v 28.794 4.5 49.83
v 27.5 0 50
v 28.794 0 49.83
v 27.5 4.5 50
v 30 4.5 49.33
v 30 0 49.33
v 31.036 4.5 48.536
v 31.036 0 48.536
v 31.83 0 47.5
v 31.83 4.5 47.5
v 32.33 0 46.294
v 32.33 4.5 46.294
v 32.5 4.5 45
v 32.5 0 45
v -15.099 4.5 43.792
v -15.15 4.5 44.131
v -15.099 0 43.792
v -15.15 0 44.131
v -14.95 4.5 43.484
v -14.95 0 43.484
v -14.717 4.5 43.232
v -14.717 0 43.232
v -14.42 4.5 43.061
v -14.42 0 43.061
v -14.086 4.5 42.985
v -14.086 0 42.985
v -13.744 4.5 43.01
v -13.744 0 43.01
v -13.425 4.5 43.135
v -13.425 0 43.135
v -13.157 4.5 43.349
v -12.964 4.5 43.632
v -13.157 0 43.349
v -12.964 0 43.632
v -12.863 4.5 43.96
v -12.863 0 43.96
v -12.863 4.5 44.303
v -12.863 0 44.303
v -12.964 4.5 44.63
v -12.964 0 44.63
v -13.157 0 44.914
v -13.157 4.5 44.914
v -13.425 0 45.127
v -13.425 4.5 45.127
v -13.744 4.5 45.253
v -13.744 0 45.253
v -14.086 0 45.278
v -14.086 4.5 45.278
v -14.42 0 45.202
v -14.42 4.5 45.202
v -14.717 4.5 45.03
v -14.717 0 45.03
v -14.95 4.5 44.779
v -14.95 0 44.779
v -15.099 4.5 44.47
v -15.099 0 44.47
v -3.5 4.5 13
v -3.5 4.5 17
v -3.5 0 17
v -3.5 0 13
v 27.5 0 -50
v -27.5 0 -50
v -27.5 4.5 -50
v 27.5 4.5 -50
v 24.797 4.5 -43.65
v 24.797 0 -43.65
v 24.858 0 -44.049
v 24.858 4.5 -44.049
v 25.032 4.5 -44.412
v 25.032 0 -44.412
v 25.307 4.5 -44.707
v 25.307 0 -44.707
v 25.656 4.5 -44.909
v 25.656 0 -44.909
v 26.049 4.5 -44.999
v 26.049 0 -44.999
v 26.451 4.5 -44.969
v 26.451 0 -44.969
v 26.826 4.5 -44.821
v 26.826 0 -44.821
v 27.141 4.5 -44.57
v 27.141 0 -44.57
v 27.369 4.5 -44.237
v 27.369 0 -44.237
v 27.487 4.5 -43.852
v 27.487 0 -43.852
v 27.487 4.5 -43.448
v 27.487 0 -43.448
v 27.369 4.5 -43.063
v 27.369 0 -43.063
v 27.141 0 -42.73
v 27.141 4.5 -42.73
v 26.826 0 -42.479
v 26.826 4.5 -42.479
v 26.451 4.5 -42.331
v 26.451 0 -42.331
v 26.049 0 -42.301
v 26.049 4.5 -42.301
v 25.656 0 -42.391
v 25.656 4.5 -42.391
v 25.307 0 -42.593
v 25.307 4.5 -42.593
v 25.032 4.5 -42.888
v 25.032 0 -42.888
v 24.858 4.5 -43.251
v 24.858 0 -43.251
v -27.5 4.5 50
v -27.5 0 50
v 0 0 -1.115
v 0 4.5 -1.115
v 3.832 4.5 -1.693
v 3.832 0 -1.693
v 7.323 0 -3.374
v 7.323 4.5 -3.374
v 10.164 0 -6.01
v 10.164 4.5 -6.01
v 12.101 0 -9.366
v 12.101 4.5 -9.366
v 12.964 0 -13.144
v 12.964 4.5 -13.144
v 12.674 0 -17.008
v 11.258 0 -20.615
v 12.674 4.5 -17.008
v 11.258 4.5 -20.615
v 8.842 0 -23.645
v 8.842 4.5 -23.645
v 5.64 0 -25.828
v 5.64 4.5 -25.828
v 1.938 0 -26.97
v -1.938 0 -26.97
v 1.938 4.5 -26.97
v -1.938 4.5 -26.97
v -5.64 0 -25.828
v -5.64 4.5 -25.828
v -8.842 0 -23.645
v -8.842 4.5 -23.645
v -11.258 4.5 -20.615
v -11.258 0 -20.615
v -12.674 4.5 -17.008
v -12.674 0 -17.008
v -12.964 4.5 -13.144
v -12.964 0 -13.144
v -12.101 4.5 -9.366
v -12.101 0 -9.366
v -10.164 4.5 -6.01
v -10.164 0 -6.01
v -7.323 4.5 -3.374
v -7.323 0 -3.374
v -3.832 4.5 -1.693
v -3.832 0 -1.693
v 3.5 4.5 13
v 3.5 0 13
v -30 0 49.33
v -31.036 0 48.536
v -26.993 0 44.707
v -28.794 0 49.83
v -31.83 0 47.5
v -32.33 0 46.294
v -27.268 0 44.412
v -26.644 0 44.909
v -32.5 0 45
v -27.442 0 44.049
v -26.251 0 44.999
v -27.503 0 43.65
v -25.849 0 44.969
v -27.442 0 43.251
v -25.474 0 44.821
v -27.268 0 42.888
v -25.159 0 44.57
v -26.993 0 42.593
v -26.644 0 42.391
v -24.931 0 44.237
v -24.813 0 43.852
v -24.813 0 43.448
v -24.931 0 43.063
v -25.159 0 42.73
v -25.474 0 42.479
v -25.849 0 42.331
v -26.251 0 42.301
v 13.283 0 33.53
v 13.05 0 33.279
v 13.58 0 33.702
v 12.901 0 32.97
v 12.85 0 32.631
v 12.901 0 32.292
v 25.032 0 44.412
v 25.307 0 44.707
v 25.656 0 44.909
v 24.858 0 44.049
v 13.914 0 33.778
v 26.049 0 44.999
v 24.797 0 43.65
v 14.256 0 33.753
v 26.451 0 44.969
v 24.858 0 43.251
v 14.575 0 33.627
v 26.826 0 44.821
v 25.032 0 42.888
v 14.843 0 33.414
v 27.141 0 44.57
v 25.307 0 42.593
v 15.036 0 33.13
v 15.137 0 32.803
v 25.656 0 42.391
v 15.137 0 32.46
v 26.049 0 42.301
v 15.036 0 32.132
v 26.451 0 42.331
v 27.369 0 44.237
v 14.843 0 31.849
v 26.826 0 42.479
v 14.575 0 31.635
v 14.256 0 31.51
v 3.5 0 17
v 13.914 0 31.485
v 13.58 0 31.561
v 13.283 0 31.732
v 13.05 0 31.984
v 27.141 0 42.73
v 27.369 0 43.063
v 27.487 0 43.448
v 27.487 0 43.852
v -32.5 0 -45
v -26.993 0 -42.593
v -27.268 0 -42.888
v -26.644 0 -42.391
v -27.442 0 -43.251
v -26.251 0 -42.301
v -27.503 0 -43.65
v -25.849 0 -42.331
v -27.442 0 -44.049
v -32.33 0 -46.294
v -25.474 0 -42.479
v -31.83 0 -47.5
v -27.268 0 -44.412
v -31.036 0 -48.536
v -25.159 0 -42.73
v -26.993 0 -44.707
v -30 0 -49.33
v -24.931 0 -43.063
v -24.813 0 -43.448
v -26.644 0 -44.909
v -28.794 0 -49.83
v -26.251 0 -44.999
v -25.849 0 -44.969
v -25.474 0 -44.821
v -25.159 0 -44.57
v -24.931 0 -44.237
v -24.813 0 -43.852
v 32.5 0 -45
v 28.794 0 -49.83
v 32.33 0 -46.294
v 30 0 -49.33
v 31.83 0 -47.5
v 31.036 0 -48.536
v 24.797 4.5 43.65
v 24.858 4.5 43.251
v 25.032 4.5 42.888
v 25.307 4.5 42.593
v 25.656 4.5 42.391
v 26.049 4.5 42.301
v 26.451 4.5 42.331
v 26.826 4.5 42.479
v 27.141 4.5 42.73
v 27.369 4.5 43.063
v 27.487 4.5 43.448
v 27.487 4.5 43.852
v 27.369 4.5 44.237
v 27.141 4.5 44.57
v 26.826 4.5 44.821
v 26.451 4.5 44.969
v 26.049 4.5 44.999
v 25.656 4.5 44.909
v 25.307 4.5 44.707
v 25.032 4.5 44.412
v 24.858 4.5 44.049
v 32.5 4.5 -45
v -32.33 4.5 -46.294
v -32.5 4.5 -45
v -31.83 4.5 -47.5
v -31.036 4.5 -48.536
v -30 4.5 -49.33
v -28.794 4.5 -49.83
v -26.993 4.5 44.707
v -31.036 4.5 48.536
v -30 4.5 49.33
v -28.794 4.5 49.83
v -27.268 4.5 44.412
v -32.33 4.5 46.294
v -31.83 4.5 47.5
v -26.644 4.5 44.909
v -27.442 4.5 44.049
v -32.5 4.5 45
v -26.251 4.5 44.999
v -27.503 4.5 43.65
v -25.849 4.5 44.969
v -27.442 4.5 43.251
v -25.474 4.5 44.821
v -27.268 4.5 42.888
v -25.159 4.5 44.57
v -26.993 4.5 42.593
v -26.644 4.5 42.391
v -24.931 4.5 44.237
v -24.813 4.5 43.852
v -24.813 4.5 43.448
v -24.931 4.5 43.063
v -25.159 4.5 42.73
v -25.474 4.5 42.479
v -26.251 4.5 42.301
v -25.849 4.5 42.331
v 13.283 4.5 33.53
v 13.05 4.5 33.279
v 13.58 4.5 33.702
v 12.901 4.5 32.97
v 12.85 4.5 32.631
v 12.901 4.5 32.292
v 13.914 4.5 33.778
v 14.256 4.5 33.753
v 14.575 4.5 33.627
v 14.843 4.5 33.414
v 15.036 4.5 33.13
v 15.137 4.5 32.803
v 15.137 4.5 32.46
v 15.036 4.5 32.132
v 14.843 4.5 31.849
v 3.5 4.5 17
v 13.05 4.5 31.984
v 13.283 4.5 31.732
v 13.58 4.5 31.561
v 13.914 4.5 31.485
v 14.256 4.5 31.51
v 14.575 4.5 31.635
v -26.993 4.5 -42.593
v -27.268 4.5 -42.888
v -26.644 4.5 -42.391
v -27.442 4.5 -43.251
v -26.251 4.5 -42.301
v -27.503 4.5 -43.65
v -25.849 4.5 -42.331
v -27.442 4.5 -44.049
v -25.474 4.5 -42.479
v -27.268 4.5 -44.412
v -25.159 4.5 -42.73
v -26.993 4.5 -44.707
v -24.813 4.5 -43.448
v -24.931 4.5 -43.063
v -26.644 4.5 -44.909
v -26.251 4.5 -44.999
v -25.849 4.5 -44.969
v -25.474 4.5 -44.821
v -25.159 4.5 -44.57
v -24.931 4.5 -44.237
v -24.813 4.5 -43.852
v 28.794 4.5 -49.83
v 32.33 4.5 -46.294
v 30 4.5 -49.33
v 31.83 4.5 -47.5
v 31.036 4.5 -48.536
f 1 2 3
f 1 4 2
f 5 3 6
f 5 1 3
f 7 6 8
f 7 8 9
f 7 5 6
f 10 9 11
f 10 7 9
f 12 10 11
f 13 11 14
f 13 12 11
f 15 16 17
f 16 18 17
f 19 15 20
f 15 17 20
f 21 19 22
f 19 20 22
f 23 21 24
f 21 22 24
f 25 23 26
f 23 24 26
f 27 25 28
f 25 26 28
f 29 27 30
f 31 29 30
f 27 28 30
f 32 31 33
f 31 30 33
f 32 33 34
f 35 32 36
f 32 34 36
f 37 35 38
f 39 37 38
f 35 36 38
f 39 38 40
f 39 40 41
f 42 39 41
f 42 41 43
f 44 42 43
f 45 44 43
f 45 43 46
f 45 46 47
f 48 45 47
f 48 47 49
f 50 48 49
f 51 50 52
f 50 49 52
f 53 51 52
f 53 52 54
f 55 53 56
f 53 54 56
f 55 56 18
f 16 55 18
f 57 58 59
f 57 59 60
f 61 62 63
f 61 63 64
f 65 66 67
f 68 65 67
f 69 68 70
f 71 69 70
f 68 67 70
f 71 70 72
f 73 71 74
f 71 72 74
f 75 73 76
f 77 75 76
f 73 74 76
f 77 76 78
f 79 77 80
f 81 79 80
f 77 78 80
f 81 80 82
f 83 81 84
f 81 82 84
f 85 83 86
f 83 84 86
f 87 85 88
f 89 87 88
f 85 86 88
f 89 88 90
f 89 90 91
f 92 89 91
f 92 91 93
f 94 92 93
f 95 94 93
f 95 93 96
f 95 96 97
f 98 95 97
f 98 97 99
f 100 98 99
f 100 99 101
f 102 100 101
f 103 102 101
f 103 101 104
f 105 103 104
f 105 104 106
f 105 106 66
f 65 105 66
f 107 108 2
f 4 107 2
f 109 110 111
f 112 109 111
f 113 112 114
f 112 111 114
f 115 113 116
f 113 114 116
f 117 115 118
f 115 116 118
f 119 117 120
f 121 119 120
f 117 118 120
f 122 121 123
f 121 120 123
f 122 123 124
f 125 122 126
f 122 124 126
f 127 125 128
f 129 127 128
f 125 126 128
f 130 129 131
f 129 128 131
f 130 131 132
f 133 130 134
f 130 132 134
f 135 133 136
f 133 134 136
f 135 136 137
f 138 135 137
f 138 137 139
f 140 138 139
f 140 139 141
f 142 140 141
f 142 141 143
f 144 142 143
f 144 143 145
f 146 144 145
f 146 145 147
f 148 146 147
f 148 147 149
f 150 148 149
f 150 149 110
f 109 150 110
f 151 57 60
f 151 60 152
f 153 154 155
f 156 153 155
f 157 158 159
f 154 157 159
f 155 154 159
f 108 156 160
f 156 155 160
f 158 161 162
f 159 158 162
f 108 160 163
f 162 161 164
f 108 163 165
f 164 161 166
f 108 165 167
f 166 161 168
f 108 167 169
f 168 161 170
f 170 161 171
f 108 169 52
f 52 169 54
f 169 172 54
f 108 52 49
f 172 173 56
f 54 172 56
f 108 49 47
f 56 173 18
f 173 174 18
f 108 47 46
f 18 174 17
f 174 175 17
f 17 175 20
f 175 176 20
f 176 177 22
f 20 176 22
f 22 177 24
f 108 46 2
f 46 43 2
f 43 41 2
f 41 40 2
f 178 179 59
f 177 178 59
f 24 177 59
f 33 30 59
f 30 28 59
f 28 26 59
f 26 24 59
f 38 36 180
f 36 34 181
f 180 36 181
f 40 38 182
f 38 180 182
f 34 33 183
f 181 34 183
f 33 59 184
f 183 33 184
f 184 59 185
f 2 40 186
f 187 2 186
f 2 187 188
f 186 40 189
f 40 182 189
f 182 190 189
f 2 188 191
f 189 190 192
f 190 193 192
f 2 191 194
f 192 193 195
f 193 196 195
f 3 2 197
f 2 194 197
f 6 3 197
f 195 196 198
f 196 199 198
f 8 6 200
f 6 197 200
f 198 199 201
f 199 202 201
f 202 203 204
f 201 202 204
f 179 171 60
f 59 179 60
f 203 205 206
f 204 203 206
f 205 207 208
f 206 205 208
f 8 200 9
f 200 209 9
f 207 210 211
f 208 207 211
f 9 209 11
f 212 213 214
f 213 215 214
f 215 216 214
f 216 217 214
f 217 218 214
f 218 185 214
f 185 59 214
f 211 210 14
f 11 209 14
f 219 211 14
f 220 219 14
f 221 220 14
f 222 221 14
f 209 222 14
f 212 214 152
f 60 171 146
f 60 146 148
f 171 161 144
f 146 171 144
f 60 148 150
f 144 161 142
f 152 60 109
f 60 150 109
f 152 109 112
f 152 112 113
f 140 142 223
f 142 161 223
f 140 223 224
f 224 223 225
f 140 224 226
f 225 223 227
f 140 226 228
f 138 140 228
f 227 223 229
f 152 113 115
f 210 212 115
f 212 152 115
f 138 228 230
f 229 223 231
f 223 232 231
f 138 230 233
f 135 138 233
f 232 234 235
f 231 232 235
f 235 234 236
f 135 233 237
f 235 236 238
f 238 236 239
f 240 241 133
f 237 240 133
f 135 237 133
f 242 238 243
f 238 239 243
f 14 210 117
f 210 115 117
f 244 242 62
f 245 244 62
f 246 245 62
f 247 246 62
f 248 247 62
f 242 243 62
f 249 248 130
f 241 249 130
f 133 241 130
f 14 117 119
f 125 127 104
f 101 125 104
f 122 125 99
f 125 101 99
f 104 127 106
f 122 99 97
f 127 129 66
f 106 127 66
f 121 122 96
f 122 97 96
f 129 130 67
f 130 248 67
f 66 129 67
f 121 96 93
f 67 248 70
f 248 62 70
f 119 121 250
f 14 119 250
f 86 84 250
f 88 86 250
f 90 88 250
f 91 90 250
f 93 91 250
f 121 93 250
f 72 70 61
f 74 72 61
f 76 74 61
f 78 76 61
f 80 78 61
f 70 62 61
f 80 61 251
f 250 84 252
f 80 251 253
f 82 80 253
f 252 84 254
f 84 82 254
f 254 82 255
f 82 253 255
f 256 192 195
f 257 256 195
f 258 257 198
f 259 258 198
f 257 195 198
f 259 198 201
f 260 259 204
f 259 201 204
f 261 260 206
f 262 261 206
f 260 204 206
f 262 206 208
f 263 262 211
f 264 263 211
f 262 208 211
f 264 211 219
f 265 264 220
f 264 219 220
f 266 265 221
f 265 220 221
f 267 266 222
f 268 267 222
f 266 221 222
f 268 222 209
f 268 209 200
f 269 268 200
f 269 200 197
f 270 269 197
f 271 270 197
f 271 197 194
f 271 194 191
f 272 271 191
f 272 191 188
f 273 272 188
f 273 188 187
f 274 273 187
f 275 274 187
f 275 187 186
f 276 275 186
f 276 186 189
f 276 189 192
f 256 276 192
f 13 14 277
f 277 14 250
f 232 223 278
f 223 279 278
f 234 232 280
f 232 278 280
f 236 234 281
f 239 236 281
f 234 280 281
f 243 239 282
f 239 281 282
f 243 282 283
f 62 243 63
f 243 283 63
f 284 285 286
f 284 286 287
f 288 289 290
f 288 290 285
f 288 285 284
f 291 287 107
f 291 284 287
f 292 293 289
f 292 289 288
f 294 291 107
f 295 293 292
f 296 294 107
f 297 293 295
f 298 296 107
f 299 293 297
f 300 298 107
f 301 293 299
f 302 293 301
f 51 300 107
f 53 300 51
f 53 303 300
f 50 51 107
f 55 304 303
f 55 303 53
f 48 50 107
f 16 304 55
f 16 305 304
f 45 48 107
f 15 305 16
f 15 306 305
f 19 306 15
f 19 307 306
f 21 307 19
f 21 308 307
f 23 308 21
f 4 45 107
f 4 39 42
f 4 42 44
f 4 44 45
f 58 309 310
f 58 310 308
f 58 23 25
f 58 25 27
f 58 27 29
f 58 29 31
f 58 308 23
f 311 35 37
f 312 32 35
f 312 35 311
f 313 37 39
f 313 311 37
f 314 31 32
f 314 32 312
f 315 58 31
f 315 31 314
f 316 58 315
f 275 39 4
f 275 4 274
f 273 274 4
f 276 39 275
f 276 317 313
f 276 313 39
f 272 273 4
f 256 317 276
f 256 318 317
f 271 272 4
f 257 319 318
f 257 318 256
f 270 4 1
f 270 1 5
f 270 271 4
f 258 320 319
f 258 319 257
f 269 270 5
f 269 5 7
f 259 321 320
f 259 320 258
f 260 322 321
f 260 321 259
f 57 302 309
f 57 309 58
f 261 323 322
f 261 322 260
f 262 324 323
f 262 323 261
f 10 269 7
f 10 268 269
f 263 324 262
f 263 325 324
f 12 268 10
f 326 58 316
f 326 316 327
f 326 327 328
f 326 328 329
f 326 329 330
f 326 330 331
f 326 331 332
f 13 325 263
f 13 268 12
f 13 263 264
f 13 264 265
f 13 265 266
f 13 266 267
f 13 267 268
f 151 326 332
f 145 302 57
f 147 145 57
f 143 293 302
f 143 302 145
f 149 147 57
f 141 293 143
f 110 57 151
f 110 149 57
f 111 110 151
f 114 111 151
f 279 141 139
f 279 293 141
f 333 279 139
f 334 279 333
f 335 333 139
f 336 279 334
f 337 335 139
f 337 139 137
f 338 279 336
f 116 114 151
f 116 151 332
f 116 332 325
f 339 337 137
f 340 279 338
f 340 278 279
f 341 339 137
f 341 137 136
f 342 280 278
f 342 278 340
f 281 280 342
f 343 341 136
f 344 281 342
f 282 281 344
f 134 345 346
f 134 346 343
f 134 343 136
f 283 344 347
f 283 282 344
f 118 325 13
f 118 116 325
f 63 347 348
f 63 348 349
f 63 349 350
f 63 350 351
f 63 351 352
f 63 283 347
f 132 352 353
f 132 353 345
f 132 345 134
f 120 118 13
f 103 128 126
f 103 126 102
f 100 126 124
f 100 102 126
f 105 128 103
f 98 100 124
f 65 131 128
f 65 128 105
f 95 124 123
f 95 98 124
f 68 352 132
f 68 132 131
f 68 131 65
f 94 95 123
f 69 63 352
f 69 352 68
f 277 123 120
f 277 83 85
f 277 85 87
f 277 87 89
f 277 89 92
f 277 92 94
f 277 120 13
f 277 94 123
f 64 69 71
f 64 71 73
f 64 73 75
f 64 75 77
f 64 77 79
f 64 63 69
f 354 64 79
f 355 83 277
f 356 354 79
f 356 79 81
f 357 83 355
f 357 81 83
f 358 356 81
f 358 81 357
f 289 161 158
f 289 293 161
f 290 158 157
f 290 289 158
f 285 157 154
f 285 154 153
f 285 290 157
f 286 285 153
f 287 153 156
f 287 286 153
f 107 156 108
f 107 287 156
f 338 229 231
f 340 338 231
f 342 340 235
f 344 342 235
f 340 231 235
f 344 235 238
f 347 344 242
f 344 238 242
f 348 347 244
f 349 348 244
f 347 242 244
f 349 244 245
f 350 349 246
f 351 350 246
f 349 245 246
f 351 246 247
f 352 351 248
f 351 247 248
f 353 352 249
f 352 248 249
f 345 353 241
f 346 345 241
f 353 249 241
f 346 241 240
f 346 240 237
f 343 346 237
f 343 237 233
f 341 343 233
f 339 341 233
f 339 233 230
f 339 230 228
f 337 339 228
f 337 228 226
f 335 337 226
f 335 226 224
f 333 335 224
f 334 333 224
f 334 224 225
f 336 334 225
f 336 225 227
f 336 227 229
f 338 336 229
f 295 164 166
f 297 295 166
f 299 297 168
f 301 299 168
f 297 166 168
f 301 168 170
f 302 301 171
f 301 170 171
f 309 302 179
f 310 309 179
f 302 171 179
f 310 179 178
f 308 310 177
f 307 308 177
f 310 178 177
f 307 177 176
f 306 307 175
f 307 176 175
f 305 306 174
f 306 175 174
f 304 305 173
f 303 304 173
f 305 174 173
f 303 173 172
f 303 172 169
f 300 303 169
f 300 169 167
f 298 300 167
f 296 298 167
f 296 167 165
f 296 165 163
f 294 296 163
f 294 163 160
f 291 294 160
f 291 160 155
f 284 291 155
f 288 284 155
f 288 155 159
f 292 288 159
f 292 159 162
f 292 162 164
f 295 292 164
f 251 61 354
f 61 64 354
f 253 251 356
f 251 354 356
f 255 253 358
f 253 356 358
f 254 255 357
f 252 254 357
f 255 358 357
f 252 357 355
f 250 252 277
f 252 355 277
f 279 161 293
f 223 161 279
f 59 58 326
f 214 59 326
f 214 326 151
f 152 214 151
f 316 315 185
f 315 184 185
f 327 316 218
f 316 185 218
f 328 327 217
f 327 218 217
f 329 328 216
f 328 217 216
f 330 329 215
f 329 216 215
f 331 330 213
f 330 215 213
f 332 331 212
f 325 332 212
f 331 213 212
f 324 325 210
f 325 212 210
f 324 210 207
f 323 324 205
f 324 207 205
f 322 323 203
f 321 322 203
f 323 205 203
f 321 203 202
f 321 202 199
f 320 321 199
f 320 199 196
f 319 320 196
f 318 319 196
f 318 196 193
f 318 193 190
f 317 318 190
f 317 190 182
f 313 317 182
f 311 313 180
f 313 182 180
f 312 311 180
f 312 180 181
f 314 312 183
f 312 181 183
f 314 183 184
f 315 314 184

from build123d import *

# Parameters (mm, degrees)
SKETCH2_W                          = 65
SKETCH2_H                          = 100
BOSS_EXTRUDE1_DEPTH                = 4.5
F_36_0_1065_DIAMETER_HOLE1_D       = 2.7051
FILLET1_R                          = 5
TAP_DRILL_FOR_M2_2_HELICOIL1_D     = 2.3
TAP_DRILL_FOR_M2_2_HELICOIL1_DEPTH = 4.5
TAP_DRILL_FOR_M2_2_HELICOIL1_TIP   = 0.690989712
SKETCH14_W                         = 7
SKETCH14_H                         = 4
CUT_EXTRUDE1_DEPTH                 = 10
SKETCH16_R                         = 13
CUT_EXTRUDE2_DEPTH                 = 17


with BuildPart() as part:
    # Sketch2 → Boss-Extrude1 (new body)
    with BuildSketch(Plane(origin=(0, 0, 0), x_dir=(1, 0, 0), z_dir=(0, 1, 0))):
        Rectangle(SKETCH2_W, SKETCH2_H)
    extrude(amount=BOSS_EXTRUDE1_DEPTH)

    # #36 (0.1065) Diameter Hole1 (through all)
    with Locations(Plane(origin=(0, 4.5, 0), x_dir=(1, 0, 0), z_dir=(0, 1, 0))):
        with Locations((-26.15, 43.65), (26.15, 43.65), (26.15, -43.65), (-26.15, -43.65)):
            Hole(F_36_0_1065_DIAMETER_HOLE1_D / 2)

    # Fillet1
    fillet1_edges = [part.edges().sort_by_distance(p)[0] for p in [
        (32.5, 2.25, 50),
        (-32.5, 2.25, 50),
        (-32.5, 2.25, -50),
        (32.5, 2.25, -50),
    ]]
    fillet(fillet1_edges, radius=FILLET1_R)

    # Tap Drill for M2.2 Helicoil1
    with Locations(Plane(origin=(0, 4.5, 0), x_dir=(1, 0, 0), z_dir=(0, 1, 0))):
        with Locations((14, -32.631381325), (-14, -44.131381325)):
            Hole(TAP_DRILL_FOR_M2_2_HELICOIL1_D / 2, depth=TAP_DRILL_FOR_M2_2_HELICOIL1_DEPTH)
            with Locations((0, 0, -(TAP_DRILL_FOR_M2_2_HELICOIL1_DEPTH + TAP_DRILL_FOR_M2_2_HELICOIL1_TIP / 2))):  # 118° drill point
                Cone(0, TAP_DRILL_FOR_M2_2_HELICOIL1_D / 2, TAP_DRILL_FOR_M2_2_HELICOIL1_TIP, mode=Mode.SUBTRACT)

    # Sketch14 → Cut-Extrude1 (cut)
    with BuildSketch(Plane(origin=(0, 4.5, 0), x_dir=(1, 0, 0), z_dir=(0, 1, 0))):
        with Locations((0, -15)):
            Rectangle(SKETCH14_W, SKETCH14_H)
    extrude(amount=-CUT_EXTRUDE1_DEPTH, mode=Mode.SUBTRACT)

    # Sketch16 → Cut-Extrude2 (cut)
    with BuildSketch(Plane(origin=(0, 4.5, 0), x_dir=(1, 0, 0), z_dir=(0, 1, 0))):
        with Locations(Location((0, 14.115370647, 0), (0, 0, 270))):
            Circle(SKETCH16_R)
    extrude(amount=-CUT_EXTRUDE2_DEPTH, mode=Mode.SUBTRACT)


solid = part.part
